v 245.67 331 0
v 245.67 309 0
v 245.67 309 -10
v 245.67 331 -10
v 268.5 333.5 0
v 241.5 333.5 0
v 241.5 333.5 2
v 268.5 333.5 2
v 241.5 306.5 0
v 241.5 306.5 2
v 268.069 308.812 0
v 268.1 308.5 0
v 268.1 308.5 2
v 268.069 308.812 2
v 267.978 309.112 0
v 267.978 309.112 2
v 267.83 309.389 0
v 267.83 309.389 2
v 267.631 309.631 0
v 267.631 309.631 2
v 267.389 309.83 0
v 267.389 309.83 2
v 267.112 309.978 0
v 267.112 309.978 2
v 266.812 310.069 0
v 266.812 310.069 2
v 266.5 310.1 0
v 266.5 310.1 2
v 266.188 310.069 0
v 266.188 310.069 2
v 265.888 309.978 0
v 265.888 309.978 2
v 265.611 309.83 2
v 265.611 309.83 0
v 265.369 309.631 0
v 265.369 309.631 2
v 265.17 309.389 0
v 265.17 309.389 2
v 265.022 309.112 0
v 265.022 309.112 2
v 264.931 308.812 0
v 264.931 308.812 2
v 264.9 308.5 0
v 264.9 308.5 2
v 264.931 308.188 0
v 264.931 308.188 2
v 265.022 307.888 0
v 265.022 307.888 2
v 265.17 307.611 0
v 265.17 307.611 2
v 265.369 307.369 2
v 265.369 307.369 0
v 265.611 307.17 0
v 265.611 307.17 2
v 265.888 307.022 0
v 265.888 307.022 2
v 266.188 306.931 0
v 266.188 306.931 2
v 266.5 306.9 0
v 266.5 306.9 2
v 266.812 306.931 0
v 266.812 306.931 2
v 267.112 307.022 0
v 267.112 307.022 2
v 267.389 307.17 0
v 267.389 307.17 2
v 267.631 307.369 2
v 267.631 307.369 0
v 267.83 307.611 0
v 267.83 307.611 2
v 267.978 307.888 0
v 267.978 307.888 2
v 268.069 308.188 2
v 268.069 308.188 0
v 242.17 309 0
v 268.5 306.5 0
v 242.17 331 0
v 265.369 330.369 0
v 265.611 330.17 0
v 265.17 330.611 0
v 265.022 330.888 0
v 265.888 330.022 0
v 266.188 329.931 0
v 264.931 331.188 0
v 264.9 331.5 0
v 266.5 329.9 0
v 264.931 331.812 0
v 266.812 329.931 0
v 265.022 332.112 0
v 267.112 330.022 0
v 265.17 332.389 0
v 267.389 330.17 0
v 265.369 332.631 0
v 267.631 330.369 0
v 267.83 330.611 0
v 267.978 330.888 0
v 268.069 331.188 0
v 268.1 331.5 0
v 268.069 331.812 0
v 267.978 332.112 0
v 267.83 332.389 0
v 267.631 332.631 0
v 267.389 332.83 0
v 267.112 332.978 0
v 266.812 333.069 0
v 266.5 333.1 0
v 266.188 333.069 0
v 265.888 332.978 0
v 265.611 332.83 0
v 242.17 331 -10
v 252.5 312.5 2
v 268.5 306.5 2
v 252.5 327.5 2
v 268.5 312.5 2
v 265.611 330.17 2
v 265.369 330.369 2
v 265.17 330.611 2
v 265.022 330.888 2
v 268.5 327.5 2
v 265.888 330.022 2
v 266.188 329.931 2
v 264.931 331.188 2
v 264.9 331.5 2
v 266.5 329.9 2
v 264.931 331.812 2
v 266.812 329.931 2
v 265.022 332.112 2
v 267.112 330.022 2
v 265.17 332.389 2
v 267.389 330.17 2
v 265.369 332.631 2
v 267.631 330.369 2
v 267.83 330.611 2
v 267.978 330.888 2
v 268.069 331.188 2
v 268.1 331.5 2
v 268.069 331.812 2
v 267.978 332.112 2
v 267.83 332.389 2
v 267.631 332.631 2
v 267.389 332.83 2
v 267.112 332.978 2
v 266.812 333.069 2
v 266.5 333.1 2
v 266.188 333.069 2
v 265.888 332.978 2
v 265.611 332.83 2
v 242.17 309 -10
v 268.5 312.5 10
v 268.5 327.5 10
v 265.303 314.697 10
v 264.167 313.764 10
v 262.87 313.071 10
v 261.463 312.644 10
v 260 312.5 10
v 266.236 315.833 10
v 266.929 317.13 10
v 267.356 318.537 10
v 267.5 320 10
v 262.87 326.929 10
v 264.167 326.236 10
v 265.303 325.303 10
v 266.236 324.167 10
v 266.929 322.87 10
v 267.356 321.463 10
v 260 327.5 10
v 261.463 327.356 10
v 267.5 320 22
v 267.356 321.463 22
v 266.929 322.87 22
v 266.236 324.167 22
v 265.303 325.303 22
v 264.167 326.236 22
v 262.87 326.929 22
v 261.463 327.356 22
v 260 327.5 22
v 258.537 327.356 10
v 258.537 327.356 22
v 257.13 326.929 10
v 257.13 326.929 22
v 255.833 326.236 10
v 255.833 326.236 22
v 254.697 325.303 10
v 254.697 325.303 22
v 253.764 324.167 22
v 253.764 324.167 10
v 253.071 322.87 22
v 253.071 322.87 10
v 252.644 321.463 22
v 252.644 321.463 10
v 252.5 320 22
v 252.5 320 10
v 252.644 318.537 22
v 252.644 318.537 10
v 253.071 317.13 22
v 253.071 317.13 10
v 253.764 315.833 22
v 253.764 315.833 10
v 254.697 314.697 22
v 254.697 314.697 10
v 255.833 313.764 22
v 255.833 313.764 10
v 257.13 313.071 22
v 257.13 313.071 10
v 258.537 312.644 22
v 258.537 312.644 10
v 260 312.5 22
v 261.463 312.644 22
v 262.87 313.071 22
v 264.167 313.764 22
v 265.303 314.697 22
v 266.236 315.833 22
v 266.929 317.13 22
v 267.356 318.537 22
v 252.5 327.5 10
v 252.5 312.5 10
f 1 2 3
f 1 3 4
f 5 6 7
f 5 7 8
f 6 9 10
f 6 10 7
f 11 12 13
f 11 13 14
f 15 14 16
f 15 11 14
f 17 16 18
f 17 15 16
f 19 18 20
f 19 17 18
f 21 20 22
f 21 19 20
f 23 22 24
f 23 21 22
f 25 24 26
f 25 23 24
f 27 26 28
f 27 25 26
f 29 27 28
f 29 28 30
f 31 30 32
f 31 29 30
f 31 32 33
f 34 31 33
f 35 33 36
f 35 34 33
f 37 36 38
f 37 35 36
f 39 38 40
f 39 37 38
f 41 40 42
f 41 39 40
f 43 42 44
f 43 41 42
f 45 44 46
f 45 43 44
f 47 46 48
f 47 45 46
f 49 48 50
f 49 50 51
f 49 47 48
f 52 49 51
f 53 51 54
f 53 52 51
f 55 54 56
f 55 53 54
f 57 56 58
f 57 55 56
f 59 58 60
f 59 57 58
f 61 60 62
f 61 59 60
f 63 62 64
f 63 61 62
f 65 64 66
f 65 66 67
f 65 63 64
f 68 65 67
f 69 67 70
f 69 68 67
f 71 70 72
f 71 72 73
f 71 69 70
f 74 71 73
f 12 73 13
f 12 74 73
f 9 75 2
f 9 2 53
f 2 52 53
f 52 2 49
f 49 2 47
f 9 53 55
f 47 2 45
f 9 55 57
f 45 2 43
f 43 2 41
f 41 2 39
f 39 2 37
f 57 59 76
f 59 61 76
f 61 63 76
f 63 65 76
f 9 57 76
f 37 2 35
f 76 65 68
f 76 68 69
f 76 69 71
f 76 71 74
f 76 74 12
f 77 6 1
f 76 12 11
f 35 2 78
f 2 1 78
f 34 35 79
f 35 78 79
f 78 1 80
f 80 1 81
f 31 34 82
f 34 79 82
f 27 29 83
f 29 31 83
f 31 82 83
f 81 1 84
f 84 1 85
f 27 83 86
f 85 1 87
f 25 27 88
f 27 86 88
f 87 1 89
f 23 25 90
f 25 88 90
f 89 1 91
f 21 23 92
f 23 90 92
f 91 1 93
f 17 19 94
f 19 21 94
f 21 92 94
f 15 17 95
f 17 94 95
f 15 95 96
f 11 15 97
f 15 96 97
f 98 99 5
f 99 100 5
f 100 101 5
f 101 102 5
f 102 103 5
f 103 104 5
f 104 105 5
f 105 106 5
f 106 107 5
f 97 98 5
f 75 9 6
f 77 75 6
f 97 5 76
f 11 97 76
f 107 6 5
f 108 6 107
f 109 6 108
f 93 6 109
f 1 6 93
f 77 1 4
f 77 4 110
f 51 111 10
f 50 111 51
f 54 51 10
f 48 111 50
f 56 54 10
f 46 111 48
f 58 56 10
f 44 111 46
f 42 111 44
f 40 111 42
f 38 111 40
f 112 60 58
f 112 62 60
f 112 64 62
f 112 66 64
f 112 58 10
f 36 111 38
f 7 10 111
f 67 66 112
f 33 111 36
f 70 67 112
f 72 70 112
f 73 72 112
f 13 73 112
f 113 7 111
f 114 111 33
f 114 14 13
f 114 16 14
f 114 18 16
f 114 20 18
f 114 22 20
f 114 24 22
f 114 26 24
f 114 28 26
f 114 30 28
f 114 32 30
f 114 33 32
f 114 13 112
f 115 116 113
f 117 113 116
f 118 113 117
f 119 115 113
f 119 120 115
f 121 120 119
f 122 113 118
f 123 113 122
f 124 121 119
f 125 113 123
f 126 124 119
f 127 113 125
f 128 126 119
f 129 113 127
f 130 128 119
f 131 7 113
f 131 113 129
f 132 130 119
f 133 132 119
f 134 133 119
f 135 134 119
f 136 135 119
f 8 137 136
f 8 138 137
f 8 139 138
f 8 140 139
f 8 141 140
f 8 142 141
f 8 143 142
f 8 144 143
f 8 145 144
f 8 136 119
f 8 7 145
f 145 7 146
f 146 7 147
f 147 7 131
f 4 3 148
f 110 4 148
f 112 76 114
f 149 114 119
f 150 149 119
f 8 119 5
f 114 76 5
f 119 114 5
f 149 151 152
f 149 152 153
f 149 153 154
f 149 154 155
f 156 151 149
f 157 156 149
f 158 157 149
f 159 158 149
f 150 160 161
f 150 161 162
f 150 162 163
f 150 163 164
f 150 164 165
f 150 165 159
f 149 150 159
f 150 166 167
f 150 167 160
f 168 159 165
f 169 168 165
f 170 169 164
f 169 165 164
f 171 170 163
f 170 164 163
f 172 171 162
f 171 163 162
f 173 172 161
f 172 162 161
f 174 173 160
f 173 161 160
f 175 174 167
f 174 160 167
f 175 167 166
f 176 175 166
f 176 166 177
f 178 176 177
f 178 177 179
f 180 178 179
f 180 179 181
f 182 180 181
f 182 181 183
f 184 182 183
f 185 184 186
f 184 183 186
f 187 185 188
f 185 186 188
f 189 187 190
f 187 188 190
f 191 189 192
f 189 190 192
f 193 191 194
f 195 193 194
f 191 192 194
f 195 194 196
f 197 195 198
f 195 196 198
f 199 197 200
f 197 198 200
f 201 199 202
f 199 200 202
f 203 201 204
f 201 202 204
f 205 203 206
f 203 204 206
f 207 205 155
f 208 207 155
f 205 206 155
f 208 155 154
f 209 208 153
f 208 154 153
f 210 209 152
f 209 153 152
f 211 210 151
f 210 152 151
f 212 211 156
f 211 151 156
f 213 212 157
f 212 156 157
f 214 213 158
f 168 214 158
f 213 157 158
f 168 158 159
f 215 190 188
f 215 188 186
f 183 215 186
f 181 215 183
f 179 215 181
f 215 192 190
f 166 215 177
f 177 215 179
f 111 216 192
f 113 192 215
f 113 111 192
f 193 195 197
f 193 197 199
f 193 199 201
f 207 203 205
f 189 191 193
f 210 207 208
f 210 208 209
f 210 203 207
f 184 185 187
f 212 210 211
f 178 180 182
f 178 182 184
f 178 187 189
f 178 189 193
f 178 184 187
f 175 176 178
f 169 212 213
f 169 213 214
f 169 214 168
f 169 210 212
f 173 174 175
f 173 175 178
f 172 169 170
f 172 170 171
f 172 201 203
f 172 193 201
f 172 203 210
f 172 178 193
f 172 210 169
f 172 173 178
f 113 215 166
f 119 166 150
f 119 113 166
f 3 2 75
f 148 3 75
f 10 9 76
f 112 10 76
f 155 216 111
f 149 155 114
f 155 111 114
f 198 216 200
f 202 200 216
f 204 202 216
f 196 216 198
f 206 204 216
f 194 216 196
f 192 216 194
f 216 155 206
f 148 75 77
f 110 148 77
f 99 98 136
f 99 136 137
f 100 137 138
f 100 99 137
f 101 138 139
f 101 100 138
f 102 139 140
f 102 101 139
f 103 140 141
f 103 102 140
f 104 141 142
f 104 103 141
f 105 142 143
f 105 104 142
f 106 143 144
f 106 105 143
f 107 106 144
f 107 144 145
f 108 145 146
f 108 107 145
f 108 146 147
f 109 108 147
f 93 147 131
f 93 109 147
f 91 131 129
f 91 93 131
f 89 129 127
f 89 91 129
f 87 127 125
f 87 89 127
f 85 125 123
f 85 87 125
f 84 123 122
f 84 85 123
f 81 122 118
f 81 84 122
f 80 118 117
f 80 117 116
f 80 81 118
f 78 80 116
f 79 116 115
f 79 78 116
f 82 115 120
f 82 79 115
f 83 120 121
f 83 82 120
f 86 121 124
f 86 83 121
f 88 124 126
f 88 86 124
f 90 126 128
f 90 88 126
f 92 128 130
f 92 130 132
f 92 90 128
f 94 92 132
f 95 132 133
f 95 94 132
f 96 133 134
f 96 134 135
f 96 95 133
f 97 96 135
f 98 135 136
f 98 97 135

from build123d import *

# Parameters (mm, degrees)
SKETCH_1_W      = 27
SKETCH_1_H      = 27
SKETCH_1_R      = 1.6
EXTRUDE_1_DEPTH = 2
SKETCH_2_R      = 7.5
EXTRUDE_2_DEPTH = 20
SKETCH_3_W      = 16
SKETCH_3_H      = 15
EXTRUDE_3_DEPTH = 8
SKETCH_4_W      = 3.5
SKETCH_4_H      = 22
EXTRUDE_4_DEPTH = 10


with BuildPart() as part:
    # 草图1 → 凸台-拉伸1 (new body)
    with BuildSketch(Plane.XY):
        with Locations((255, 320)):
            Rectangle(SKETCH_1_W, SKETCH_1_H)
        with Locations((266.5, 331.5)):
            Circle(SKETCH_1_R, mode=Mode.SUBTRACT)
        with Locations((266.5, 308.5)):
            Circle(SKETCH_1_R, mode=Mode.SUBTRACT)
    extrude(amount=EXTRUDE_1_DEPTH)

    # 草图2 → 凸台-拉伸2 (add)
    with BuildSketch(Plane.XY.offset(2)):
        with Locations((260, 320)):
            Circle(SKETCH_2_R)
    extrude(amount=EXTRUDE_2_DEPTH)

    # 草图3 → 凸台-拉伸3 (add)
    with BuildSketch(Plane.XY.offset(2)):
        with Locations((260.5, 320)):
            Rectangle(SKETCH_3_W, SKETCH_3_H)
    extrude(amount=EXTRUDE_3_DEPTH)

    # 草图4 → 凸台-拉伸4 (add)
    with BuildSketch(Plane(origin=(0, 0, 0), x_dir=(-1, 0, 0), z_dir=(0, 0, -1))):
        with Locations((-243.92, 320)):
            Rectangle(SKETCH_4_W, SKETCH_4_H)
    extrude(amount=EXTRUDE_4_DEPTH)


solid = part.part
